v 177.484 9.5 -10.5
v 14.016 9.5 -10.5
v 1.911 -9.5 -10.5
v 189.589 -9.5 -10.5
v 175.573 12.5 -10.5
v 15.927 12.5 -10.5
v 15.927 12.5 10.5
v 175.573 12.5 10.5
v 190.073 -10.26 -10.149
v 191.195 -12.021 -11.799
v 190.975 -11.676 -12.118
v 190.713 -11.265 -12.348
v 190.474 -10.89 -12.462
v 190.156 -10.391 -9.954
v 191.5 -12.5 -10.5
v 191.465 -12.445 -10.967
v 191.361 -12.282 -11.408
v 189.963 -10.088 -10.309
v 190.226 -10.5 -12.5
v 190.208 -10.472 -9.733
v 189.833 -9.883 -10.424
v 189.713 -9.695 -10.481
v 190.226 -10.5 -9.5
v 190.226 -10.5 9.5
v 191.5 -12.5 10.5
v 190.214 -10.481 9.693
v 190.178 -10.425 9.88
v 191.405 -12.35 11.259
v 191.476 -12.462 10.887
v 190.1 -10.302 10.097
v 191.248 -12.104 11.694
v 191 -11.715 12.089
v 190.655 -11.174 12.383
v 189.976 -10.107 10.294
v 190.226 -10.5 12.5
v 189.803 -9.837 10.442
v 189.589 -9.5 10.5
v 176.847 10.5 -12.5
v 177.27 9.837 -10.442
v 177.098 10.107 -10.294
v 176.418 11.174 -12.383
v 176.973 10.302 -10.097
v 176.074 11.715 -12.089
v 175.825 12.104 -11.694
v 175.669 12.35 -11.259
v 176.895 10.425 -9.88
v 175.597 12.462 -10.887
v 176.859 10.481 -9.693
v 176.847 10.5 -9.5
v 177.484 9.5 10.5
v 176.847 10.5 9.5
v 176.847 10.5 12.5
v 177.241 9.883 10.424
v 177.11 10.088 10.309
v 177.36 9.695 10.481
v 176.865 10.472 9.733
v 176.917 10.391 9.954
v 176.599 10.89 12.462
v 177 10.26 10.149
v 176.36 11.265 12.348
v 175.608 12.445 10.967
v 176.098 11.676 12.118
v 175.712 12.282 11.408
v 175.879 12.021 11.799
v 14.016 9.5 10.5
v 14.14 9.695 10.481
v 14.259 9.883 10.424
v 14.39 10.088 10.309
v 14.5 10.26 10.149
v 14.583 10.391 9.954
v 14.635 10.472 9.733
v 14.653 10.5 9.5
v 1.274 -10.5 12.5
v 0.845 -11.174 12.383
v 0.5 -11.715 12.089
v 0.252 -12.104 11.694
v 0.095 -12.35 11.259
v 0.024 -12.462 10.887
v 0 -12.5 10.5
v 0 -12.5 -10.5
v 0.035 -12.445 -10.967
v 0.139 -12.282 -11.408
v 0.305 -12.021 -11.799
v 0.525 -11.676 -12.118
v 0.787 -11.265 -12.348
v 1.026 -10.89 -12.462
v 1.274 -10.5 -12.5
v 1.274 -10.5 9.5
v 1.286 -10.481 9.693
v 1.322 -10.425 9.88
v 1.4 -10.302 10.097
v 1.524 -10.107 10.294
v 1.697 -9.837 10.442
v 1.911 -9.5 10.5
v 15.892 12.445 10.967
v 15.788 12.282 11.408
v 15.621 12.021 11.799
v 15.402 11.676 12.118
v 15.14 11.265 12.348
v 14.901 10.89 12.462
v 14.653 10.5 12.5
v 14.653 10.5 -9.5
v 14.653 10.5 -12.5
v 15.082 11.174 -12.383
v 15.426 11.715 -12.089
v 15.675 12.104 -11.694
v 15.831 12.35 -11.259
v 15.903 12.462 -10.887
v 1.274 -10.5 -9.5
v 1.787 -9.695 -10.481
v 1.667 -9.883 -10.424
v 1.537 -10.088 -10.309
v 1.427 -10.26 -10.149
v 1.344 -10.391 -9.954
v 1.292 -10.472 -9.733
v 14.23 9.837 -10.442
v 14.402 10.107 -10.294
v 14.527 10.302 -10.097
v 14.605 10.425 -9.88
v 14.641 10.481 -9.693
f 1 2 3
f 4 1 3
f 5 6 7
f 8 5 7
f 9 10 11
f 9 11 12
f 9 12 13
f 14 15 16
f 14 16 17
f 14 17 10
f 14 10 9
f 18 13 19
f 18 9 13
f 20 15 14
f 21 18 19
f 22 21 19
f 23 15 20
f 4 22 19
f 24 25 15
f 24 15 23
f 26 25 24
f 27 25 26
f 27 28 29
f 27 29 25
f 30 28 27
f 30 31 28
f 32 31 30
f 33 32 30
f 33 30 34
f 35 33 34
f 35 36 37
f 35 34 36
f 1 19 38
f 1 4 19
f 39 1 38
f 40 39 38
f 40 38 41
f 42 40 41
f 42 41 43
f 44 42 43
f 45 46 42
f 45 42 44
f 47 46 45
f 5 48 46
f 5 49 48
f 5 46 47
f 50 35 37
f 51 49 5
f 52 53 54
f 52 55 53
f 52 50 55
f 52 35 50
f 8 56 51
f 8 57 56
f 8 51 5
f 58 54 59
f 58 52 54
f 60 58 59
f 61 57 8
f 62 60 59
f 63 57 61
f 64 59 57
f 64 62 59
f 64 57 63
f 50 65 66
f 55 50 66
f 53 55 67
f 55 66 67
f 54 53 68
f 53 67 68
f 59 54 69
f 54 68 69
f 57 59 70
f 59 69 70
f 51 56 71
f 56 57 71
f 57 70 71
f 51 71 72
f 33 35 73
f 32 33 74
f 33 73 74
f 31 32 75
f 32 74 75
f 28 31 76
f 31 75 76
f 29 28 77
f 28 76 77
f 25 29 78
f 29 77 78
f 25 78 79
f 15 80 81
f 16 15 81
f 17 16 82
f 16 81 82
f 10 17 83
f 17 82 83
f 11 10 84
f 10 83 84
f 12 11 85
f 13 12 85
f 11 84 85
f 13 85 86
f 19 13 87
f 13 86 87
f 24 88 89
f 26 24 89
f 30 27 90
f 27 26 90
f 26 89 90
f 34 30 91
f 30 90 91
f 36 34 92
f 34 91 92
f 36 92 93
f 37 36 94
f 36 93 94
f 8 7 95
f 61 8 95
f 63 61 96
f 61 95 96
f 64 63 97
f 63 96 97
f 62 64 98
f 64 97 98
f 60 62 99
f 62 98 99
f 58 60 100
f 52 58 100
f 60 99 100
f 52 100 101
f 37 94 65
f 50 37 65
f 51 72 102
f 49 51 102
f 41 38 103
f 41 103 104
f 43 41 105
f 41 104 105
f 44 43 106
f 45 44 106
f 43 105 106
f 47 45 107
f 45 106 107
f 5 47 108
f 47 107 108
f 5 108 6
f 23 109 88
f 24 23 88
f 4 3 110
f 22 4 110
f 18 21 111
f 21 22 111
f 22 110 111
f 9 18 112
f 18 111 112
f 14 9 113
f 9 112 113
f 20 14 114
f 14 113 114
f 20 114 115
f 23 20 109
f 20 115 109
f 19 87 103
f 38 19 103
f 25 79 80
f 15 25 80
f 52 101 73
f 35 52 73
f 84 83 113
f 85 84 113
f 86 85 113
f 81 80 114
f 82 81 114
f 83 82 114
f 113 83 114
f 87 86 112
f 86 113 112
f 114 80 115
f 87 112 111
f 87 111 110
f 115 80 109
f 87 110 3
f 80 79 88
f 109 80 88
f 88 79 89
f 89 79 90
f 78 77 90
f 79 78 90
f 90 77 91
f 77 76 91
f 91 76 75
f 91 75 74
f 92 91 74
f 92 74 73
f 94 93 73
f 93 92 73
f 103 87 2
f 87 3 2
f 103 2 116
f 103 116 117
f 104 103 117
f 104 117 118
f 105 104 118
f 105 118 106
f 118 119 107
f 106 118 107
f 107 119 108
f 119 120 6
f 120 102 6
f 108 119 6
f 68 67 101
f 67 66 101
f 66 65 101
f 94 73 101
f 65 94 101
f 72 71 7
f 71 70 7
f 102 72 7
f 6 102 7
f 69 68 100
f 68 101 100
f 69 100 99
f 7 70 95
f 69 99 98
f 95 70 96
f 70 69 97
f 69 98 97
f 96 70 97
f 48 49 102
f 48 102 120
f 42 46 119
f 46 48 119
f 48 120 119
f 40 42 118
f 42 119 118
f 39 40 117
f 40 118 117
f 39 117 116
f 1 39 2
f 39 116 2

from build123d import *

# Parameters (mm, degrees)
HANDBRAKE_TOP_SUPPORT_EXTRUDE_DEPTH = 191.5
HANDBRAKE_TOP_SUPPORT_CUT_REACH     = 195.529


with BuildPart() as part:
    # Sketch1<8> → handbrake top support extrude (new body)
    with BuildSketch(Plane(origin=(0, 0, 0), x_dir=(0, 0, -1), z_dir=(1, 0, 0))):
        with BuildLine():
            Line((10.5, 12.5), (-10.5, 12.5))
            ThreePointArc((-10.5, 12.5), (-11.914213562, 11.914213562), (-12.5, 10.5))
            Line((-12.5, 10.5), (-12.5, -10.5))
            ThreePointArc((-12.5, -10.5), (-11.914213562, -11.914213562), (-10.5, -12.5))
            Line((-10.5, -12.5), (10.5, -12.5))
            ThreePointArc((10.5, -12.5), (11.914213562, -11.914213562), (12.5, -10.5))
            Line((12.5, -10.5), (12.5, 10.5))
            ThreePointArc((12.5, 10.5), (11.914213562, 11.914213562), (10.5, 12.5))
        make_face()
        with BuildLine():
            Line((-9.5, 10.5), (9.5, 10.5))
            ThreePointArc((9.5, 10.5), (10.207106781, 10.207106781), (10.5, 9.5))
            Line((10.5, 9.5), (10.5, -9.5))
            ThreePointArc((10.5, -9.5), (10.207106781, -10.207106781), (9.5, -10.5))
            Line((9.5, -10.5), (-9.5, -10.5))
            ThreePointArc((-9.5, -10.5), (-10.207106781, -10.207106781), (-10.5, -9.5))
            Line((-10.5, -9.5), (-10.5, 9.5))
            ThreePointArc((-10.5, 9.5), (-10.207106781, 10.207106781), (-9.5, 10.5))
        make_face(mode=Mode.SUBTRACT)
    extrude(amount=HANDBRAKE_TOP_SUPPORT_EXTRUDE_DEPTH)

    # Sketch7 → handbrake top support cut (cut, up to next)
    with BuildSketch(Plane.XY.offset(12.5), mode=Mode.PRIVATE) as handbrake_top_support_cut_sk1:
        Polygon((0, 12.5), (0, -12.5), (15.92675652, 12.5), align=None)
    handbrake_top_support_cut_tool1 = extrude(handbrake_top_support_cut_sk1.sketch, amount=-HANDBRAKE_TOP_SUPPORT_CUT_REACH, mode=Mode.PRIVATE) & part.part
    # Sketch7 → handbrake top support cut (cut, up to next)
    with BuildSketch(Plane.XY.offset(12.5), mode=Mode.PRIVATE) as handbrake_top_support_cut_sk2:
        Polygon((191.5, -12.5), (175.57324348, 12.5), (191.5, 12.5), align=None)
    handbrake_top_support_cut_tool2 = extrude(handbrake_top_support_cut_sk2.sketch, amount=-HANDBRAKE_TOP_SUPPORT_CUT_REACH, mode=Mode.PRIVATE) & part.part
    add(handbrake_top_support_cut_tool1.solids().sort_by_distance((5.308919, 4.166667, 12.5))[0], mode=Mode.SUBTRACT)
    add(handbrake_top_support_cut_tool2.solids().sort_by_distance((186.191081, 4.166667, 12.5))[0], mode=Mode.SUBTRACT)


solid = part.part
